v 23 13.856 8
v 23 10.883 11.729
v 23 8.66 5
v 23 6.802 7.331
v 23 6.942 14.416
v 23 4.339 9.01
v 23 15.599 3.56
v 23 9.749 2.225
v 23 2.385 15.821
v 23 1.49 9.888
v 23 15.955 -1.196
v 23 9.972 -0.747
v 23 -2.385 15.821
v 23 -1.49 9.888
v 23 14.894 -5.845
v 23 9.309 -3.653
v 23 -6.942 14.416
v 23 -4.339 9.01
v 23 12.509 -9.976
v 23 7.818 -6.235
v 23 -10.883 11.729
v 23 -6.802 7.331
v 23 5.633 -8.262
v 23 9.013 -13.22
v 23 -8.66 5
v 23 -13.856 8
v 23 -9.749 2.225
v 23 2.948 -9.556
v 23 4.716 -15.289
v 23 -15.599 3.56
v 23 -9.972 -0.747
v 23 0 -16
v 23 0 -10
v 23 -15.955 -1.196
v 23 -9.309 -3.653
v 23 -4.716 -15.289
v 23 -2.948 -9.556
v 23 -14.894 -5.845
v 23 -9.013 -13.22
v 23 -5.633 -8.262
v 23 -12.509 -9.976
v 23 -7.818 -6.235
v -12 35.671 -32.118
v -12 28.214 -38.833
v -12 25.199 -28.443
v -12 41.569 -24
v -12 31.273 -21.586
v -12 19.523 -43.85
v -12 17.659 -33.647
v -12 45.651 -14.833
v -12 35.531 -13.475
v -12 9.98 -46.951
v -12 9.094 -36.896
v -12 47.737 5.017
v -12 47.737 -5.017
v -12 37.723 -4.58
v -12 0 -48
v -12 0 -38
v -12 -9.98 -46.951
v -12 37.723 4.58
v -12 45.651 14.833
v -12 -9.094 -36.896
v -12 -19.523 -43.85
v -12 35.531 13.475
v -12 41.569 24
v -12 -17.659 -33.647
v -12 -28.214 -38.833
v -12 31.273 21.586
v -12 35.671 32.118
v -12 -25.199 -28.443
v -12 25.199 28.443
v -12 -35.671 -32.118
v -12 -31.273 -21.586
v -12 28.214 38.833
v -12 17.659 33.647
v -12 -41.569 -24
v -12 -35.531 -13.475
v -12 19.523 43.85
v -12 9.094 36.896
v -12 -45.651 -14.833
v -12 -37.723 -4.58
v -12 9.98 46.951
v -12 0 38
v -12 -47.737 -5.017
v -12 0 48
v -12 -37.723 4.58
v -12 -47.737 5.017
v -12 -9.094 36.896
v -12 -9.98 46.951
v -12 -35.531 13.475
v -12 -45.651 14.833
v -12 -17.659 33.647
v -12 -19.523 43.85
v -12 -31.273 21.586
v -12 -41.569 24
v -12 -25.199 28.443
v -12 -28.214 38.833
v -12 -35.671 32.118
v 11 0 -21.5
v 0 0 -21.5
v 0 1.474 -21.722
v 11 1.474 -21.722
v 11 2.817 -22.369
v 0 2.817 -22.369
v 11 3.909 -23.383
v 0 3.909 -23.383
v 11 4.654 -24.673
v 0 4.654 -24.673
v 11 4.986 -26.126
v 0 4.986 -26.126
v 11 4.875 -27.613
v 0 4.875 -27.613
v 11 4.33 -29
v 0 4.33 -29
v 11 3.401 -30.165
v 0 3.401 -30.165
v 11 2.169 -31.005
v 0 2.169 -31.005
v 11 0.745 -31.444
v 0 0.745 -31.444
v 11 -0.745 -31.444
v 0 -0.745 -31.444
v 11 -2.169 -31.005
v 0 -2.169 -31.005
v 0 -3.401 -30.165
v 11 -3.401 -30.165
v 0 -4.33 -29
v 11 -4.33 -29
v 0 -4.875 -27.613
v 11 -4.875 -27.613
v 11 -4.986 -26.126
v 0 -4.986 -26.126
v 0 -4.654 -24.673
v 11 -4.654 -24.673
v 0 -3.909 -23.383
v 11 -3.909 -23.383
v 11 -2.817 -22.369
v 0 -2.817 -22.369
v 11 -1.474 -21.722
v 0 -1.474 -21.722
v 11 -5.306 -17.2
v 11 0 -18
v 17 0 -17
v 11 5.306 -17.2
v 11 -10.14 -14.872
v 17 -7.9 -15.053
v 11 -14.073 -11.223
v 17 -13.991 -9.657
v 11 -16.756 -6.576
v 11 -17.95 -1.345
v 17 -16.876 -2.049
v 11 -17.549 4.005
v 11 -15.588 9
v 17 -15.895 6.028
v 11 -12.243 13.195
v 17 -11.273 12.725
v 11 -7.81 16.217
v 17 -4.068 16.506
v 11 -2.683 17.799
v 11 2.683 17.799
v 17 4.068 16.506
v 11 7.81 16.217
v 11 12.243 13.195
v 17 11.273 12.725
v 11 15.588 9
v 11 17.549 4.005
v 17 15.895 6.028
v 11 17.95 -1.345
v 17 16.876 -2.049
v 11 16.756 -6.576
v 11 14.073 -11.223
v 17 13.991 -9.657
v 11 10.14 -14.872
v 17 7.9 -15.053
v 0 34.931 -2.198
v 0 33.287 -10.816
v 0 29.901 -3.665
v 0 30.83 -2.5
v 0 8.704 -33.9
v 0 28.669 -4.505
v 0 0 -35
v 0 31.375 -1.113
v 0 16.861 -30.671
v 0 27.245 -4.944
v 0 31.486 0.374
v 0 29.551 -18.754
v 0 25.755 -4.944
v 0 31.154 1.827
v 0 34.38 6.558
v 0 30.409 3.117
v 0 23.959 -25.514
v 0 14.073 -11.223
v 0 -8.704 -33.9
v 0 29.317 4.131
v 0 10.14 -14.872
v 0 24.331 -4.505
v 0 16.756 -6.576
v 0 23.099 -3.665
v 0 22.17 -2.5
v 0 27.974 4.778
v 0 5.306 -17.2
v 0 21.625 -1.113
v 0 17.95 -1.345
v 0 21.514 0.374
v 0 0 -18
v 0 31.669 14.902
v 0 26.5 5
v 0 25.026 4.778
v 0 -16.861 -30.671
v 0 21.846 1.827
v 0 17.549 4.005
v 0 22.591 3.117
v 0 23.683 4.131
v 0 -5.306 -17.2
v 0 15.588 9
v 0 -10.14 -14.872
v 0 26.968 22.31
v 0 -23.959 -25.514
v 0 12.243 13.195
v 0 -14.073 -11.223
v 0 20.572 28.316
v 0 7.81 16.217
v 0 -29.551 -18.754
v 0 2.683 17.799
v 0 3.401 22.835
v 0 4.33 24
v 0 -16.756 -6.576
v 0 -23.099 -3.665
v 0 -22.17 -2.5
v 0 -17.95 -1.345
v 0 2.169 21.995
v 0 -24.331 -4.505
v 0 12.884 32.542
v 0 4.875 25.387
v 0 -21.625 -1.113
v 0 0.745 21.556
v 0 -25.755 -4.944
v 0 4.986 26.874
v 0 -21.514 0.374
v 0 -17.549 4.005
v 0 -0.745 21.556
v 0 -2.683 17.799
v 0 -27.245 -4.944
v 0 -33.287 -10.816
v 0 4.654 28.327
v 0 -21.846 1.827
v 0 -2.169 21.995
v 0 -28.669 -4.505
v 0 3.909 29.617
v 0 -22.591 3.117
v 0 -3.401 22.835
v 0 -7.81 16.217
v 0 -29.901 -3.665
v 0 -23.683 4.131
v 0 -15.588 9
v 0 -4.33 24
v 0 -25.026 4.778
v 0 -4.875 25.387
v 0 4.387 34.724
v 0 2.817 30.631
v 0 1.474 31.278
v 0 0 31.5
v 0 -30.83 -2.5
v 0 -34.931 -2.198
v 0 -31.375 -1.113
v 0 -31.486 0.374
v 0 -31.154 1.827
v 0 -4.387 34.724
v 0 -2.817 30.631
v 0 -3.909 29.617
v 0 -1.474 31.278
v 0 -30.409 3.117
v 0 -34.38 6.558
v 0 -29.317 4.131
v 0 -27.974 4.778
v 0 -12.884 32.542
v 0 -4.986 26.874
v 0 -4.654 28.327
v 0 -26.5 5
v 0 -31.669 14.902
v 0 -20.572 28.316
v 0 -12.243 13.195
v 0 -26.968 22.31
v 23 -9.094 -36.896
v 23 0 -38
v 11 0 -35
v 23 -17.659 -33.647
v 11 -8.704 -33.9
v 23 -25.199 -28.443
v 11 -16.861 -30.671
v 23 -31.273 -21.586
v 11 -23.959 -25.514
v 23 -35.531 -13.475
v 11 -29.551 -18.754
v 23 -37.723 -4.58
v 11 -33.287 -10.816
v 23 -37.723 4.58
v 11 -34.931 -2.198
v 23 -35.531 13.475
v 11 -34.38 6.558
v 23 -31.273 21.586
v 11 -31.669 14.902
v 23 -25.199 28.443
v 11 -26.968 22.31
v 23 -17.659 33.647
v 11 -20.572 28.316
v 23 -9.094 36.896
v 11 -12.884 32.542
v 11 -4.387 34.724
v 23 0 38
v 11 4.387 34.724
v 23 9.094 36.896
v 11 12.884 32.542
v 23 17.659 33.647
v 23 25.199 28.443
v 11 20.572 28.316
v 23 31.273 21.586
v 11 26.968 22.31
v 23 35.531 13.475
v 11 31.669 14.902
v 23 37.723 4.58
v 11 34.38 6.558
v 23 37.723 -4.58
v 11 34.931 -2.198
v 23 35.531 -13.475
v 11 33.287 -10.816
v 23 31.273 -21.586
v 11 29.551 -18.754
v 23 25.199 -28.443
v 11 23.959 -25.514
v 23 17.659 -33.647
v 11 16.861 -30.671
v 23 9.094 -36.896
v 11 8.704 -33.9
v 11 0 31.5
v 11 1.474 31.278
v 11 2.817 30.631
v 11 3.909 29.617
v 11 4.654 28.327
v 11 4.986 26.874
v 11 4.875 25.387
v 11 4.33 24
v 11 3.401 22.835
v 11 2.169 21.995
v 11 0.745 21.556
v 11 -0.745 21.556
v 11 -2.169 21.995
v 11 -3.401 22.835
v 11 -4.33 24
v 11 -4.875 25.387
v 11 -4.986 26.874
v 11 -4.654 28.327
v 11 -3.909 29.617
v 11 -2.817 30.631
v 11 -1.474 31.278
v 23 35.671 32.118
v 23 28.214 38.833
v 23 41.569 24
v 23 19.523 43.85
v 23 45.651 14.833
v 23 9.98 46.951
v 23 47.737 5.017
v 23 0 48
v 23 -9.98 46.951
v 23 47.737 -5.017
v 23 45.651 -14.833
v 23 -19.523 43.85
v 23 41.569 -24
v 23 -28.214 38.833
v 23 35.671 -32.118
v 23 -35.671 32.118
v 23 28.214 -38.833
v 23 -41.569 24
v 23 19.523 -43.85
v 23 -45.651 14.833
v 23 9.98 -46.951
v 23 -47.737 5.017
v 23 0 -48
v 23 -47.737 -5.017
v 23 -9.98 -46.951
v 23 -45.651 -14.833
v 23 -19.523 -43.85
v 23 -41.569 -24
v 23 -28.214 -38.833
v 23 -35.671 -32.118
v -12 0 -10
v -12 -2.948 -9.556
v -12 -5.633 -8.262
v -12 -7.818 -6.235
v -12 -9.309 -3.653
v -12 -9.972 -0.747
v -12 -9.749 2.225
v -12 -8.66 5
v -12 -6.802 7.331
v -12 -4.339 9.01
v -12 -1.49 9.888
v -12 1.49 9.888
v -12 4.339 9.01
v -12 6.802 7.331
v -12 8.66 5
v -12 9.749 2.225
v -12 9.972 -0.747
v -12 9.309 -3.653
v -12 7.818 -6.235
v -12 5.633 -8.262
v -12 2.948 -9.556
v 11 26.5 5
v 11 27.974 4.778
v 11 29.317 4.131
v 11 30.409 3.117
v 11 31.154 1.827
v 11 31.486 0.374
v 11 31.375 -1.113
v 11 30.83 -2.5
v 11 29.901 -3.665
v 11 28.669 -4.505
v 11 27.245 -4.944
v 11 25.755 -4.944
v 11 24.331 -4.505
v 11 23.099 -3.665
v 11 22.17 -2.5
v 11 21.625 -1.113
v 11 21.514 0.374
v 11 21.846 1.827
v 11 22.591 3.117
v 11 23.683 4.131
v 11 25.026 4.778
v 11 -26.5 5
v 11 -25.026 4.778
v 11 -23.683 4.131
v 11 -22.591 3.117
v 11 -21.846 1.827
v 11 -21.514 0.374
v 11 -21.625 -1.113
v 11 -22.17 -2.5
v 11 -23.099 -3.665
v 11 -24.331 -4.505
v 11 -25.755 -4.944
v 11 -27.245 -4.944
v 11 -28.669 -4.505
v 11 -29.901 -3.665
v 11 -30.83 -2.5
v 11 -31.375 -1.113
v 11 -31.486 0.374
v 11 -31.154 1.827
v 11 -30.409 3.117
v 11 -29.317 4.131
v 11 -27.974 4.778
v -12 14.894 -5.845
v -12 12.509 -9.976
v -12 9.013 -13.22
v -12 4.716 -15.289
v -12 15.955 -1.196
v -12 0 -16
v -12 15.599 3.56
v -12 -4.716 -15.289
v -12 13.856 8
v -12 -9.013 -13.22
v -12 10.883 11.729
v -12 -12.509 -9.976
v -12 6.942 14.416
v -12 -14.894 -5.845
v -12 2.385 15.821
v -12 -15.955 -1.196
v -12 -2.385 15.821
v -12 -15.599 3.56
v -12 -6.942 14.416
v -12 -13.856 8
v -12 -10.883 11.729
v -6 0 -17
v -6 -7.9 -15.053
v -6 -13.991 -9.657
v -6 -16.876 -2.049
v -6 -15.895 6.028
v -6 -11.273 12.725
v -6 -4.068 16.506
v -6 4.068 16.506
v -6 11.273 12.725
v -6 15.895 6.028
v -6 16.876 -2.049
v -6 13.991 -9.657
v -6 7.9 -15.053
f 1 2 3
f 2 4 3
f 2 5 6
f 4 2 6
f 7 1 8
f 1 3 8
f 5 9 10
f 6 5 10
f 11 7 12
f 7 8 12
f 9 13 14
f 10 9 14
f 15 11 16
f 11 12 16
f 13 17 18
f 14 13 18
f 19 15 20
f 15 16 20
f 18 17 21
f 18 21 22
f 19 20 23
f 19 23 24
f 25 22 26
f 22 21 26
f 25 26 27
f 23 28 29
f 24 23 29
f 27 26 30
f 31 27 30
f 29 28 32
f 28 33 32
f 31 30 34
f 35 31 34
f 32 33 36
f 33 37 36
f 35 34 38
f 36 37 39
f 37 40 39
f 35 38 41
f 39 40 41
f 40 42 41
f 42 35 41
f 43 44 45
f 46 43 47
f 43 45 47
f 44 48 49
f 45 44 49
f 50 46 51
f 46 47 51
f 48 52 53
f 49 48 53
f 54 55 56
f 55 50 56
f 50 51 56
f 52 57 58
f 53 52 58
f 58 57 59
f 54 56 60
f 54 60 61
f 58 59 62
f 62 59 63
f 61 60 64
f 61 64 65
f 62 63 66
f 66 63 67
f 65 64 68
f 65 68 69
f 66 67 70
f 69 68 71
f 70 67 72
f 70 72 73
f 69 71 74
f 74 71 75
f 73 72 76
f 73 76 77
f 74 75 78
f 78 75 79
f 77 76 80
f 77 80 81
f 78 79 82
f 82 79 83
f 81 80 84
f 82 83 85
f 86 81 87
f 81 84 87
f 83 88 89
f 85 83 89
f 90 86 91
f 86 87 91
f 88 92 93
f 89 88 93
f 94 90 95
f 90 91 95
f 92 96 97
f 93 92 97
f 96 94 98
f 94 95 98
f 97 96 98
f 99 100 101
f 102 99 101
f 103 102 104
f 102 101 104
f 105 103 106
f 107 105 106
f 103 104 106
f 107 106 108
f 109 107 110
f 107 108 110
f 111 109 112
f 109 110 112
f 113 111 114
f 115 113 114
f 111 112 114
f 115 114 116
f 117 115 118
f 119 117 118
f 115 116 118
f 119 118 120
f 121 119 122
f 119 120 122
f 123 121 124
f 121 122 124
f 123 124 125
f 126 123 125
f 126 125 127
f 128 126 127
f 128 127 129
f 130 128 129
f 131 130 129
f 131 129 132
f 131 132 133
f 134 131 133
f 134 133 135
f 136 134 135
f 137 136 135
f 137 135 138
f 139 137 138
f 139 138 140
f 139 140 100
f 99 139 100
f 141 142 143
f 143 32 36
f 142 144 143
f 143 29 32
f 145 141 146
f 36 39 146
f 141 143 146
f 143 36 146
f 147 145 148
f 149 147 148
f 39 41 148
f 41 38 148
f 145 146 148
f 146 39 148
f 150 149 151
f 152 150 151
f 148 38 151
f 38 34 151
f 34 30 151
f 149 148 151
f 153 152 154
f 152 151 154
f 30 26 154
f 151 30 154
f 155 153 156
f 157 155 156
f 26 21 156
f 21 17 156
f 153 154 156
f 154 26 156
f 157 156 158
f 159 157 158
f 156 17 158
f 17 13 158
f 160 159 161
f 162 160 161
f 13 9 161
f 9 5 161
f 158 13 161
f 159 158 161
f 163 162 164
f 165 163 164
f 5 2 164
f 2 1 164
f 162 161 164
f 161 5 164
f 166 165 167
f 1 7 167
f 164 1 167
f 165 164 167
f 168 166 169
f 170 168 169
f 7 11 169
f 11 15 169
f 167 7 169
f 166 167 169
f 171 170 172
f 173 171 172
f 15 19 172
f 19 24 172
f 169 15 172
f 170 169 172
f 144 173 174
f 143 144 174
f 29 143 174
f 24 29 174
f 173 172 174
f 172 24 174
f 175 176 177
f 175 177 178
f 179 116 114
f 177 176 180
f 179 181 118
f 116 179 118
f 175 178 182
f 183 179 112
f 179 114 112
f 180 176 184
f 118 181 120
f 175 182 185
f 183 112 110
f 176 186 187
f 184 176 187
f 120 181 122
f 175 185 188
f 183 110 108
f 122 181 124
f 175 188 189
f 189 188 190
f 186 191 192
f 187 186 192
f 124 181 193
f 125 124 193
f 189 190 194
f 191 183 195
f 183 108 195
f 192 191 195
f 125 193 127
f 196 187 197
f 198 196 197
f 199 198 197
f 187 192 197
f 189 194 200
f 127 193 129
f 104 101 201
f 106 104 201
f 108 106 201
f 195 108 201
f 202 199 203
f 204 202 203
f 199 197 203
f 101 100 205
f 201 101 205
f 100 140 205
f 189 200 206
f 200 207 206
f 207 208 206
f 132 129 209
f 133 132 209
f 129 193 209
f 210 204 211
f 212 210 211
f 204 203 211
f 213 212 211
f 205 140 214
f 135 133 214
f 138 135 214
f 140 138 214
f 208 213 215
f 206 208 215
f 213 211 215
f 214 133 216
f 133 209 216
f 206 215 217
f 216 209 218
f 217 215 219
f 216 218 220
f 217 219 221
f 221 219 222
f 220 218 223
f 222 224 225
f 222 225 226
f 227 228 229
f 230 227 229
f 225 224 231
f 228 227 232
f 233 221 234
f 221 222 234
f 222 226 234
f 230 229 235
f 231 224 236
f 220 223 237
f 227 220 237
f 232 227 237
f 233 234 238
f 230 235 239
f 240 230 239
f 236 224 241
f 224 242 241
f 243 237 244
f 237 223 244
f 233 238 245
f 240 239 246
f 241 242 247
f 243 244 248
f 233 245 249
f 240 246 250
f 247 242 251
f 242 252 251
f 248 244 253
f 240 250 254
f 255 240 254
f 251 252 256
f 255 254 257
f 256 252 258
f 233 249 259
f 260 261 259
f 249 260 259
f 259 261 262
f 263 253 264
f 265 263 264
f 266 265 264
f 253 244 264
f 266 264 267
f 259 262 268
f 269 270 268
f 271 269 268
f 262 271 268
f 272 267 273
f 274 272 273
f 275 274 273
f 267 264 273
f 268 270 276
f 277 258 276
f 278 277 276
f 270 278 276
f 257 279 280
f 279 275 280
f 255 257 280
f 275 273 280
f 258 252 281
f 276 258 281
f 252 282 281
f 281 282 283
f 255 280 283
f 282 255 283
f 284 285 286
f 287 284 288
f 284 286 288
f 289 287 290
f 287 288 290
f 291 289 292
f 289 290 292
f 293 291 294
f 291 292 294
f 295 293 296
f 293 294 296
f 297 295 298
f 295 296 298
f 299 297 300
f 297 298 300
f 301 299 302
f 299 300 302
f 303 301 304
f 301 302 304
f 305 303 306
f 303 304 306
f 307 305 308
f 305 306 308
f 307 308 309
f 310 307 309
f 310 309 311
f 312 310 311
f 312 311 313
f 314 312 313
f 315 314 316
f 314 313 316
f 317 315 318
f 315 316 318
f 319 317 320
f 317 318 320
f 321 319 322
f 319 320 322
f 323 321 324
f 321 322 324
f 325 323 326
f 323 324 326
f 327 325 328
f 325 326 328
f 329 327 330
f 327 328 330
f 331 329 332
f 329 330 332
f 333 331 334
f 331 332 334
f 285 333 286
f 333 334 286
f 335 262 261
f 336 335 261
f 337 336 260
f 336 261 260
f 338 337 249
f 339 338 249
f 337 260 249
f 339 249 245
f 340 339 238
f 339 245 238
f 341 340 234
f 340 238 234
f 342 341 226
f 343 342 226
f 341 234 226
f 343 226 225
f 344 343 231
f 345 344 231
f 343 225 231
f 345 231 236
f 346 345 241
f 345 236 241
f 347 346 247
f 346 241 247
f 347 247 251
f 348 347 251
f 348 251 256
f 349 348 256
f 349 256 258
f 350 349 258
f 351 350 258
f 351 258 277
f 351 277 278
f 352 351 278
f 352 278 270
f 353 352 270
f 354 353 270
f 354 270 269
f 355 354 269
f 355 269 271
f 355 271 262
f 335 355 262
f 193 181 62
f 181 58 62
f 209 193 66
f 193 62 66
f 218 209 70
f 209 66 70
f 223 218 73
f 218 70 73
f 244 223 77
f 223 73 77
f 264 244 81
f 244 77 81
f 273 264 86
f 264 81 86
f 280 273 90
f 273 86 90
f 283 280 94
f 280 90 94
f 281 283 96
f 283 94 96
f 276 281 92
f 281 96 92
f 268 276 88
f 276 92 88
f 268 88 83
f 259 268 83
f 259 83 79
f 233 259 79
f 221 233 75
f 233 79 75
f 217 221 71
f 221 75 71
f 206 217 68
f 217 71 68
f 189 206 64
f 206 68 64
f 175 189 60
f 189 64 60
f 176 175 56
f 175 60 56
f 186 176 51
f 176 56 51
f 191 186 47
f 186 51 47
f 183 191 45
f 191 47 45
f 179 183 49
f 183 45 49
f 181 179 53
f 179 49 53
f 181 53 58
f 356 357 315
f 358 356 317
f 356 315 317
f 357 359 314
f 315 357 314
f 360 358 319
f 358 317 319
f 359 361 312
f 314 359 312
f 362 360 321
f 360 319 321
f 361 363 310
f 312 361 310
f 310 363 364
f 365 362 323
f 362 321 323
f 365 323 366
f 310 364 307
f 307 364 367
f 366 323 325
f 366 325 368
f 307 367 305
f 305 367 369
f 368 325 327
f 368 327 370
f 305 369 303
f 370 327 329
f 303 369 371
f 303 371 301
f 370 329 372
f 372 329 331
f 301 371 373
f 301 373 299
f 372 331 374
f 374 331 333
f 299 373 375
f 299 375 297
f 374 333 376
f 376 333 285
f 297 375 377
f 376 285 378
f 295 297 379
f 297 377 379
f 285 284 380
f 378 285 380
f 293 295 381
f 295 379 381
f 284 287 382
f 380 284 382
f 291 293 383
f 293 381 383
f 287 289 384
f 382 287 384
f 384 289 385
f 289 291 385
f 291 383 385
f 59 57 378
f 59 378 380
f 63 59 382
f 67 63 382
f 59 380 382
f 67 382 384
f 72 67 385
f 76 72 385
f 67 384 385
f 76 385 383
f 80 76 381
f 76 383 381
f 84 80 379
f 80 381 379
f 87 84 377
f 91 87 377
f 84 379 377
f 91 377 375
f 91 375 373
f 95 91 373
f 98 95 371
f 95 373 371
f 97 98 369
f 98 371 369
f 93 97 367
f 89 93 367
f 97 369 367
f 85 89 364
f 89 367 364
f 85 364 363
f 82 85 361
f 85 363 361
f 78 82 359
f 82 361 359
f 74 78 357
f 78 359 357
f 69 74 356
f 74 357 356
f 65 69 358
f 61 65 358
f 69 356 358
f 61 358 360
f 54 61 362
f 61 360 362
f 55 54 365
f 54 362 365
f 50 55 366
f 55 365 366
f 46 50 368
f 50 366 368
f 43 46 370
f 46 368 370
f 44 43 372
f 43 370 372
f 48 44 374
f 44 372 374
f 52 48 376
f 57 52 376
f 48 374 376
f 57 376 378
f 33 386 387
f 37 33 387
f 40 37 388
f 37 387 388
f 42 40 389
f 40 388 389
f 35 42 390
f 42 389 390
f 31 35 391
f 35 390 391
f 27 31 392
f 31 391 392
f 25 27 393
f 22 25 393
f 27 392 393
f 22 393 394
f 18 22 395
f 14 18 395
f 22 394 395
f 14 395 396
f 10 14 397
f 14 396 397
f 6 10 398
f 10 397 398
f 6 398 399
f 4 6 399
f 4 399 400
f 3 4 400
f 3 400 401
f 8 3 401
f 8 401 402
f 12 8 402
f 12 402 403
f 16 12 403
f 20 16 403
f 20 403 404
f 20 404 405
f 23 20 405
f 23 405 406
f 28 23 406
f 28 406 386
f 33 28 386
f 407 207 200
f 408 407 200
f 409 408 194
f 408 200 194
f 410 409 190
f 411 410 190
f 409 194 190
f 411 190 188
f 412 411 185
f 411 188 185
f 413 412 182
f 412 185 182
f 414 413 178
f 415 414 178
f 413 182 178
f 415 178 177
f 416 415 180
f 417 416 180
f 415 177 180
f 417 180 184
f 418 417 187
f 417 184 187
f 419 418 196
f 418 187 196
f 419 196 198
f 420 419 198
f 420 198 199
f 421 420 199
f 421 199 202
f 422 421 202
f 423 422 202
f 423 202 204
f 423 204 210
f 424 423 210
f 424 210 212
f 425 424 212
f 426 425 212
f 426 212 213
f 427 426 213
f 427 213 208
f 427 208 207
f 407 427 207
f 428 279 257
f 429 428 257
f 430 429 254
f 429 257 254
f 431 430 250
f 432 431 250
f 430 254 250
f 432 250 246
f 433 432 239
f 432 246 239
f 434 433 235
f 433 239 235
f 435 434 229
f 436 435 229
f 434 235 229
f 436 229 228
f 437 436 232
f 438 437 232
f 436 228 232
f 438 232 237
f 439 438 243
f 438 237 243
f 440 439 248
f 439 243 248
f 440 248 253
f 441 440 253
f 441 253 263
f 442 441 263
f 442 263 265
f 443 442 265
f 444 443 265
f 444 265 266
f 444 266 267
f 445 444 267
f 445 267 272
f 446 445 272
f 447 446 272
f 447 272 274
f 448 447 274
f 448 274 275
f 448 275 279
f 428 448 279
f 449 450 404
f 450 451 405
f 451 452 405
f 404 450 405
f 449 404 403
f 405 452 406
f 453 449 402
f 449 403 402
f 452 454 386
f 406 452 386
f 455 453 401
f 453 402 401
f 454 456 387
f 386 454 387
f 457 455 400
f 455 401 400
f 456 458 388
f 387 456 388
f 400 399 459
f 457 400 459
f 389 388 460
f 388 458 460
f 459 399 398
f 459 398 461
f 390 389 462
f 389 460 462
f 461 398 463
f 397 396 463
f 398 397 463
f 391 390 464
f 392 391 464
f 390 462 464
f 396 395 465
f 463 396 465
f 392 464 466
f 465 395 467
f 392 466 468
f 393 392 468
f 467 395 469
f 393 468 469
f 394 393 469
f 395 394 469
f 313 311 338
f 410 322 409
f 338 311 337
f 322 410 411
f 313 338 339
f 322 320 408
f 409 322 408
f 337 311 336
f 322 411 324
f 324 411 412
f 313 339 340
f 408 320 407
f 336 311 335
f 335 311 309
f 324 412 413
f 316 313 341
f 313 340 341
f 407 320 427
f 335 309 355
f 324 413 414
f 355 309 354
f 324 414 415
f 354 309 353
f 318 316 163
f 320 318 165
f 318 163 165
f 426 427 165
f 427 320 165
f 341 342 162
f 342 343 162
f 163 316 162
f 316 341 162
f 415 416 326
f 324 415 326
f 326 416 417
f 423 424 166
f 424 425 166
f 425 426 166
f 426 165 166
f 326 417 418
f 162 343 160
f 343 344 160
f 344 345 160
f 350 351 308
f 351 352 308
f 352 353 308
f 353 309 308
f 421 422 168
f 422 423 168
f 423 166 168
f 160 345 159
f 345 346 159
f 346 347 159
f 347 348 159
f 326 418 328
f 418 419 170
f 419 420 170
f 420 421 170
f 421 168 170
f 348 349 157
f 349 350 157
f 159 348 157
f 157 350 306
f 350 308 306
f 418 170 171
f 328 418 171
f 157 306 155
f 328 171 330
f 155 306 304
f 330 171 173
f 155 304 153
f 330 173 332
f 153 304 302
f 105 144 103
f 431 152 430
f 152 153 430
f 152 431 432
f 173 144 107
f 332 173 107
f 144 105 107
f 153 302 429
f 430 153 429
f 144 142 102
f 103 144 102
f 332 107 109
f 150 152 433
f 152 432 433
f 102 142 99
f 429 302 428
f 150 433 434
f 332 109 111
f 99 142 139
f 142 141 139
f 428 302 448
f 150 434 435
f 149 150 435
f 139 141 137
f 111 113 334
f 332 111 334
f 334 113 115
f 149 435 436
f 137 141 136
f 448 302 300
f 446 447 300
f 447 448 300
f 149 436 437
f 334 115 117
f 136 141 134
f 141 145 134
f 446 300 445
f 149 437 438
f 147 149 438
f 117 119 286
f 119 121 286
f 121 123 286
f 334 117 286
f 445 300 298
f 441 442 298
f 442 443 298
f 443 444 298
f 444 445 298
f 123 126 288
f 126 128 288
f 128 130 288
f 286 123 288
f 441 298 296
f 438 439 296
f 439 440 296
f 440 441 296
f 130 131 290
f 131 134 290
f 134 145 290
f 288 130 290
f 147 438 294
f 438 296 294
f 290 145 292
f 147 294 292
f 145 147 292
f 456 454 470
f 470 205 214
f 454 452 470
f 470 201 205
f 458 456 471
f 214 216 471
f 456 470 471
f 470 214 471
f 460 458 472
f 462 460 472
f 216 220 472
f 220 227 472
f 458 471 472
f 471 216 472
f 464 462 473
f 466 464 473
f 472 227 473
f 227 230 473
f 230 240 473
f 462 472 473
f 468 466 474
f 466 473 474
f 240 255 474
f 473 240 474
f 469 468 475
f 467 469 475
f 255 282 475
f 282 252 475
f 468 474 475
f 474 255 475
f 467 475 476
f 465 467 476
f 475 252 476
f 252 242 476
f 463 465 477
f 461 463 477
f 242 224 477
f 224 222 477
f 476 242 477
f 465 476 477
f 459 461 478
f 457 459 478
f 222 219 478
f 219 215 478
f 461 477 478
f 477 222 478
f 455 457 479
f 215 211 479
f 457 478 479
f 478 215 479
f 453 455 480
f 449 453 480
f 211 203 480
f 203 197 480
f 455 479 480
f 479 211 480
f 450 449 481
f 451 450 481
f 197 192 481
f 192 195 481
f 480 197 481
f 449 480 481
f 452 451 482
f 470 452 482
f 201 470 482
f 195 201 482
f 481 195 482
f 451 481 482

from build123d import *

# Parameters (mm, degrees)
CUT_EXTRUDE3_START = -40.72
SKETCH15_R         = 10
CUT_EXTRUDE3_DEPTH = 40.72
SKETCH16_R         = 5
CUT_EXTRUDE4_DEPTH = 40.72


with BuildPart() as part:
    # Sketch1 → Revolve5 (revolve)
    with BuildSketch(Plane.XY, mode=Mode.PRIVATE) as revolve5_sk:
        Polygon((0, 0), (0, 10), (-12, 10), (-12, 16), (0, 18), (0, 35), (-12, 38), (-12, 48), (23, 48), (23, 38), (11, 35), (11, 18), (23, 16), (23, 10), (11, 10), (11, 0), align=None)
    revolve(revolve5_sk.sketch.rotate(Axis((11, 0, 0), (-1, 0, 0)), 90), axis=Axis((11, 0, 0), (-1, 0, 0)))

    # Sketch15 → Cut-Extrude3 (cut)
    with BuildSketch(Plane(origin=(11, 0, 0), x_dir=(0, 0, -1), z_dir=(1, 0, 0)).offset(CUT_EXTRUDE3_START)):
        Circle(SKETCH15_R)
    extrude(amount=CUT_EXTRUDE3_DEPTH, mode=Mode.SUBTRACT)

    # Sketch16 → Cut-Extrude4 (cut)
    with BuildSketch(Plane.ZY.offset(12)):
        with Locations((0, 26.5)):
            Circle(SKETCH16_R)
        with Locations((26.5, 0)):
            Circle(SKETCH16_R)
        with Locations((0, -26.5)):
            Circle(SKETCH16_R)
        with Locations((-26.5, 0)):
            Circle(SKETCH16_R)
    extrude(amount=-CUT_EXTRUDE4_DEPTH, mode=Mode.SUBTRACT)


solid = part.part
